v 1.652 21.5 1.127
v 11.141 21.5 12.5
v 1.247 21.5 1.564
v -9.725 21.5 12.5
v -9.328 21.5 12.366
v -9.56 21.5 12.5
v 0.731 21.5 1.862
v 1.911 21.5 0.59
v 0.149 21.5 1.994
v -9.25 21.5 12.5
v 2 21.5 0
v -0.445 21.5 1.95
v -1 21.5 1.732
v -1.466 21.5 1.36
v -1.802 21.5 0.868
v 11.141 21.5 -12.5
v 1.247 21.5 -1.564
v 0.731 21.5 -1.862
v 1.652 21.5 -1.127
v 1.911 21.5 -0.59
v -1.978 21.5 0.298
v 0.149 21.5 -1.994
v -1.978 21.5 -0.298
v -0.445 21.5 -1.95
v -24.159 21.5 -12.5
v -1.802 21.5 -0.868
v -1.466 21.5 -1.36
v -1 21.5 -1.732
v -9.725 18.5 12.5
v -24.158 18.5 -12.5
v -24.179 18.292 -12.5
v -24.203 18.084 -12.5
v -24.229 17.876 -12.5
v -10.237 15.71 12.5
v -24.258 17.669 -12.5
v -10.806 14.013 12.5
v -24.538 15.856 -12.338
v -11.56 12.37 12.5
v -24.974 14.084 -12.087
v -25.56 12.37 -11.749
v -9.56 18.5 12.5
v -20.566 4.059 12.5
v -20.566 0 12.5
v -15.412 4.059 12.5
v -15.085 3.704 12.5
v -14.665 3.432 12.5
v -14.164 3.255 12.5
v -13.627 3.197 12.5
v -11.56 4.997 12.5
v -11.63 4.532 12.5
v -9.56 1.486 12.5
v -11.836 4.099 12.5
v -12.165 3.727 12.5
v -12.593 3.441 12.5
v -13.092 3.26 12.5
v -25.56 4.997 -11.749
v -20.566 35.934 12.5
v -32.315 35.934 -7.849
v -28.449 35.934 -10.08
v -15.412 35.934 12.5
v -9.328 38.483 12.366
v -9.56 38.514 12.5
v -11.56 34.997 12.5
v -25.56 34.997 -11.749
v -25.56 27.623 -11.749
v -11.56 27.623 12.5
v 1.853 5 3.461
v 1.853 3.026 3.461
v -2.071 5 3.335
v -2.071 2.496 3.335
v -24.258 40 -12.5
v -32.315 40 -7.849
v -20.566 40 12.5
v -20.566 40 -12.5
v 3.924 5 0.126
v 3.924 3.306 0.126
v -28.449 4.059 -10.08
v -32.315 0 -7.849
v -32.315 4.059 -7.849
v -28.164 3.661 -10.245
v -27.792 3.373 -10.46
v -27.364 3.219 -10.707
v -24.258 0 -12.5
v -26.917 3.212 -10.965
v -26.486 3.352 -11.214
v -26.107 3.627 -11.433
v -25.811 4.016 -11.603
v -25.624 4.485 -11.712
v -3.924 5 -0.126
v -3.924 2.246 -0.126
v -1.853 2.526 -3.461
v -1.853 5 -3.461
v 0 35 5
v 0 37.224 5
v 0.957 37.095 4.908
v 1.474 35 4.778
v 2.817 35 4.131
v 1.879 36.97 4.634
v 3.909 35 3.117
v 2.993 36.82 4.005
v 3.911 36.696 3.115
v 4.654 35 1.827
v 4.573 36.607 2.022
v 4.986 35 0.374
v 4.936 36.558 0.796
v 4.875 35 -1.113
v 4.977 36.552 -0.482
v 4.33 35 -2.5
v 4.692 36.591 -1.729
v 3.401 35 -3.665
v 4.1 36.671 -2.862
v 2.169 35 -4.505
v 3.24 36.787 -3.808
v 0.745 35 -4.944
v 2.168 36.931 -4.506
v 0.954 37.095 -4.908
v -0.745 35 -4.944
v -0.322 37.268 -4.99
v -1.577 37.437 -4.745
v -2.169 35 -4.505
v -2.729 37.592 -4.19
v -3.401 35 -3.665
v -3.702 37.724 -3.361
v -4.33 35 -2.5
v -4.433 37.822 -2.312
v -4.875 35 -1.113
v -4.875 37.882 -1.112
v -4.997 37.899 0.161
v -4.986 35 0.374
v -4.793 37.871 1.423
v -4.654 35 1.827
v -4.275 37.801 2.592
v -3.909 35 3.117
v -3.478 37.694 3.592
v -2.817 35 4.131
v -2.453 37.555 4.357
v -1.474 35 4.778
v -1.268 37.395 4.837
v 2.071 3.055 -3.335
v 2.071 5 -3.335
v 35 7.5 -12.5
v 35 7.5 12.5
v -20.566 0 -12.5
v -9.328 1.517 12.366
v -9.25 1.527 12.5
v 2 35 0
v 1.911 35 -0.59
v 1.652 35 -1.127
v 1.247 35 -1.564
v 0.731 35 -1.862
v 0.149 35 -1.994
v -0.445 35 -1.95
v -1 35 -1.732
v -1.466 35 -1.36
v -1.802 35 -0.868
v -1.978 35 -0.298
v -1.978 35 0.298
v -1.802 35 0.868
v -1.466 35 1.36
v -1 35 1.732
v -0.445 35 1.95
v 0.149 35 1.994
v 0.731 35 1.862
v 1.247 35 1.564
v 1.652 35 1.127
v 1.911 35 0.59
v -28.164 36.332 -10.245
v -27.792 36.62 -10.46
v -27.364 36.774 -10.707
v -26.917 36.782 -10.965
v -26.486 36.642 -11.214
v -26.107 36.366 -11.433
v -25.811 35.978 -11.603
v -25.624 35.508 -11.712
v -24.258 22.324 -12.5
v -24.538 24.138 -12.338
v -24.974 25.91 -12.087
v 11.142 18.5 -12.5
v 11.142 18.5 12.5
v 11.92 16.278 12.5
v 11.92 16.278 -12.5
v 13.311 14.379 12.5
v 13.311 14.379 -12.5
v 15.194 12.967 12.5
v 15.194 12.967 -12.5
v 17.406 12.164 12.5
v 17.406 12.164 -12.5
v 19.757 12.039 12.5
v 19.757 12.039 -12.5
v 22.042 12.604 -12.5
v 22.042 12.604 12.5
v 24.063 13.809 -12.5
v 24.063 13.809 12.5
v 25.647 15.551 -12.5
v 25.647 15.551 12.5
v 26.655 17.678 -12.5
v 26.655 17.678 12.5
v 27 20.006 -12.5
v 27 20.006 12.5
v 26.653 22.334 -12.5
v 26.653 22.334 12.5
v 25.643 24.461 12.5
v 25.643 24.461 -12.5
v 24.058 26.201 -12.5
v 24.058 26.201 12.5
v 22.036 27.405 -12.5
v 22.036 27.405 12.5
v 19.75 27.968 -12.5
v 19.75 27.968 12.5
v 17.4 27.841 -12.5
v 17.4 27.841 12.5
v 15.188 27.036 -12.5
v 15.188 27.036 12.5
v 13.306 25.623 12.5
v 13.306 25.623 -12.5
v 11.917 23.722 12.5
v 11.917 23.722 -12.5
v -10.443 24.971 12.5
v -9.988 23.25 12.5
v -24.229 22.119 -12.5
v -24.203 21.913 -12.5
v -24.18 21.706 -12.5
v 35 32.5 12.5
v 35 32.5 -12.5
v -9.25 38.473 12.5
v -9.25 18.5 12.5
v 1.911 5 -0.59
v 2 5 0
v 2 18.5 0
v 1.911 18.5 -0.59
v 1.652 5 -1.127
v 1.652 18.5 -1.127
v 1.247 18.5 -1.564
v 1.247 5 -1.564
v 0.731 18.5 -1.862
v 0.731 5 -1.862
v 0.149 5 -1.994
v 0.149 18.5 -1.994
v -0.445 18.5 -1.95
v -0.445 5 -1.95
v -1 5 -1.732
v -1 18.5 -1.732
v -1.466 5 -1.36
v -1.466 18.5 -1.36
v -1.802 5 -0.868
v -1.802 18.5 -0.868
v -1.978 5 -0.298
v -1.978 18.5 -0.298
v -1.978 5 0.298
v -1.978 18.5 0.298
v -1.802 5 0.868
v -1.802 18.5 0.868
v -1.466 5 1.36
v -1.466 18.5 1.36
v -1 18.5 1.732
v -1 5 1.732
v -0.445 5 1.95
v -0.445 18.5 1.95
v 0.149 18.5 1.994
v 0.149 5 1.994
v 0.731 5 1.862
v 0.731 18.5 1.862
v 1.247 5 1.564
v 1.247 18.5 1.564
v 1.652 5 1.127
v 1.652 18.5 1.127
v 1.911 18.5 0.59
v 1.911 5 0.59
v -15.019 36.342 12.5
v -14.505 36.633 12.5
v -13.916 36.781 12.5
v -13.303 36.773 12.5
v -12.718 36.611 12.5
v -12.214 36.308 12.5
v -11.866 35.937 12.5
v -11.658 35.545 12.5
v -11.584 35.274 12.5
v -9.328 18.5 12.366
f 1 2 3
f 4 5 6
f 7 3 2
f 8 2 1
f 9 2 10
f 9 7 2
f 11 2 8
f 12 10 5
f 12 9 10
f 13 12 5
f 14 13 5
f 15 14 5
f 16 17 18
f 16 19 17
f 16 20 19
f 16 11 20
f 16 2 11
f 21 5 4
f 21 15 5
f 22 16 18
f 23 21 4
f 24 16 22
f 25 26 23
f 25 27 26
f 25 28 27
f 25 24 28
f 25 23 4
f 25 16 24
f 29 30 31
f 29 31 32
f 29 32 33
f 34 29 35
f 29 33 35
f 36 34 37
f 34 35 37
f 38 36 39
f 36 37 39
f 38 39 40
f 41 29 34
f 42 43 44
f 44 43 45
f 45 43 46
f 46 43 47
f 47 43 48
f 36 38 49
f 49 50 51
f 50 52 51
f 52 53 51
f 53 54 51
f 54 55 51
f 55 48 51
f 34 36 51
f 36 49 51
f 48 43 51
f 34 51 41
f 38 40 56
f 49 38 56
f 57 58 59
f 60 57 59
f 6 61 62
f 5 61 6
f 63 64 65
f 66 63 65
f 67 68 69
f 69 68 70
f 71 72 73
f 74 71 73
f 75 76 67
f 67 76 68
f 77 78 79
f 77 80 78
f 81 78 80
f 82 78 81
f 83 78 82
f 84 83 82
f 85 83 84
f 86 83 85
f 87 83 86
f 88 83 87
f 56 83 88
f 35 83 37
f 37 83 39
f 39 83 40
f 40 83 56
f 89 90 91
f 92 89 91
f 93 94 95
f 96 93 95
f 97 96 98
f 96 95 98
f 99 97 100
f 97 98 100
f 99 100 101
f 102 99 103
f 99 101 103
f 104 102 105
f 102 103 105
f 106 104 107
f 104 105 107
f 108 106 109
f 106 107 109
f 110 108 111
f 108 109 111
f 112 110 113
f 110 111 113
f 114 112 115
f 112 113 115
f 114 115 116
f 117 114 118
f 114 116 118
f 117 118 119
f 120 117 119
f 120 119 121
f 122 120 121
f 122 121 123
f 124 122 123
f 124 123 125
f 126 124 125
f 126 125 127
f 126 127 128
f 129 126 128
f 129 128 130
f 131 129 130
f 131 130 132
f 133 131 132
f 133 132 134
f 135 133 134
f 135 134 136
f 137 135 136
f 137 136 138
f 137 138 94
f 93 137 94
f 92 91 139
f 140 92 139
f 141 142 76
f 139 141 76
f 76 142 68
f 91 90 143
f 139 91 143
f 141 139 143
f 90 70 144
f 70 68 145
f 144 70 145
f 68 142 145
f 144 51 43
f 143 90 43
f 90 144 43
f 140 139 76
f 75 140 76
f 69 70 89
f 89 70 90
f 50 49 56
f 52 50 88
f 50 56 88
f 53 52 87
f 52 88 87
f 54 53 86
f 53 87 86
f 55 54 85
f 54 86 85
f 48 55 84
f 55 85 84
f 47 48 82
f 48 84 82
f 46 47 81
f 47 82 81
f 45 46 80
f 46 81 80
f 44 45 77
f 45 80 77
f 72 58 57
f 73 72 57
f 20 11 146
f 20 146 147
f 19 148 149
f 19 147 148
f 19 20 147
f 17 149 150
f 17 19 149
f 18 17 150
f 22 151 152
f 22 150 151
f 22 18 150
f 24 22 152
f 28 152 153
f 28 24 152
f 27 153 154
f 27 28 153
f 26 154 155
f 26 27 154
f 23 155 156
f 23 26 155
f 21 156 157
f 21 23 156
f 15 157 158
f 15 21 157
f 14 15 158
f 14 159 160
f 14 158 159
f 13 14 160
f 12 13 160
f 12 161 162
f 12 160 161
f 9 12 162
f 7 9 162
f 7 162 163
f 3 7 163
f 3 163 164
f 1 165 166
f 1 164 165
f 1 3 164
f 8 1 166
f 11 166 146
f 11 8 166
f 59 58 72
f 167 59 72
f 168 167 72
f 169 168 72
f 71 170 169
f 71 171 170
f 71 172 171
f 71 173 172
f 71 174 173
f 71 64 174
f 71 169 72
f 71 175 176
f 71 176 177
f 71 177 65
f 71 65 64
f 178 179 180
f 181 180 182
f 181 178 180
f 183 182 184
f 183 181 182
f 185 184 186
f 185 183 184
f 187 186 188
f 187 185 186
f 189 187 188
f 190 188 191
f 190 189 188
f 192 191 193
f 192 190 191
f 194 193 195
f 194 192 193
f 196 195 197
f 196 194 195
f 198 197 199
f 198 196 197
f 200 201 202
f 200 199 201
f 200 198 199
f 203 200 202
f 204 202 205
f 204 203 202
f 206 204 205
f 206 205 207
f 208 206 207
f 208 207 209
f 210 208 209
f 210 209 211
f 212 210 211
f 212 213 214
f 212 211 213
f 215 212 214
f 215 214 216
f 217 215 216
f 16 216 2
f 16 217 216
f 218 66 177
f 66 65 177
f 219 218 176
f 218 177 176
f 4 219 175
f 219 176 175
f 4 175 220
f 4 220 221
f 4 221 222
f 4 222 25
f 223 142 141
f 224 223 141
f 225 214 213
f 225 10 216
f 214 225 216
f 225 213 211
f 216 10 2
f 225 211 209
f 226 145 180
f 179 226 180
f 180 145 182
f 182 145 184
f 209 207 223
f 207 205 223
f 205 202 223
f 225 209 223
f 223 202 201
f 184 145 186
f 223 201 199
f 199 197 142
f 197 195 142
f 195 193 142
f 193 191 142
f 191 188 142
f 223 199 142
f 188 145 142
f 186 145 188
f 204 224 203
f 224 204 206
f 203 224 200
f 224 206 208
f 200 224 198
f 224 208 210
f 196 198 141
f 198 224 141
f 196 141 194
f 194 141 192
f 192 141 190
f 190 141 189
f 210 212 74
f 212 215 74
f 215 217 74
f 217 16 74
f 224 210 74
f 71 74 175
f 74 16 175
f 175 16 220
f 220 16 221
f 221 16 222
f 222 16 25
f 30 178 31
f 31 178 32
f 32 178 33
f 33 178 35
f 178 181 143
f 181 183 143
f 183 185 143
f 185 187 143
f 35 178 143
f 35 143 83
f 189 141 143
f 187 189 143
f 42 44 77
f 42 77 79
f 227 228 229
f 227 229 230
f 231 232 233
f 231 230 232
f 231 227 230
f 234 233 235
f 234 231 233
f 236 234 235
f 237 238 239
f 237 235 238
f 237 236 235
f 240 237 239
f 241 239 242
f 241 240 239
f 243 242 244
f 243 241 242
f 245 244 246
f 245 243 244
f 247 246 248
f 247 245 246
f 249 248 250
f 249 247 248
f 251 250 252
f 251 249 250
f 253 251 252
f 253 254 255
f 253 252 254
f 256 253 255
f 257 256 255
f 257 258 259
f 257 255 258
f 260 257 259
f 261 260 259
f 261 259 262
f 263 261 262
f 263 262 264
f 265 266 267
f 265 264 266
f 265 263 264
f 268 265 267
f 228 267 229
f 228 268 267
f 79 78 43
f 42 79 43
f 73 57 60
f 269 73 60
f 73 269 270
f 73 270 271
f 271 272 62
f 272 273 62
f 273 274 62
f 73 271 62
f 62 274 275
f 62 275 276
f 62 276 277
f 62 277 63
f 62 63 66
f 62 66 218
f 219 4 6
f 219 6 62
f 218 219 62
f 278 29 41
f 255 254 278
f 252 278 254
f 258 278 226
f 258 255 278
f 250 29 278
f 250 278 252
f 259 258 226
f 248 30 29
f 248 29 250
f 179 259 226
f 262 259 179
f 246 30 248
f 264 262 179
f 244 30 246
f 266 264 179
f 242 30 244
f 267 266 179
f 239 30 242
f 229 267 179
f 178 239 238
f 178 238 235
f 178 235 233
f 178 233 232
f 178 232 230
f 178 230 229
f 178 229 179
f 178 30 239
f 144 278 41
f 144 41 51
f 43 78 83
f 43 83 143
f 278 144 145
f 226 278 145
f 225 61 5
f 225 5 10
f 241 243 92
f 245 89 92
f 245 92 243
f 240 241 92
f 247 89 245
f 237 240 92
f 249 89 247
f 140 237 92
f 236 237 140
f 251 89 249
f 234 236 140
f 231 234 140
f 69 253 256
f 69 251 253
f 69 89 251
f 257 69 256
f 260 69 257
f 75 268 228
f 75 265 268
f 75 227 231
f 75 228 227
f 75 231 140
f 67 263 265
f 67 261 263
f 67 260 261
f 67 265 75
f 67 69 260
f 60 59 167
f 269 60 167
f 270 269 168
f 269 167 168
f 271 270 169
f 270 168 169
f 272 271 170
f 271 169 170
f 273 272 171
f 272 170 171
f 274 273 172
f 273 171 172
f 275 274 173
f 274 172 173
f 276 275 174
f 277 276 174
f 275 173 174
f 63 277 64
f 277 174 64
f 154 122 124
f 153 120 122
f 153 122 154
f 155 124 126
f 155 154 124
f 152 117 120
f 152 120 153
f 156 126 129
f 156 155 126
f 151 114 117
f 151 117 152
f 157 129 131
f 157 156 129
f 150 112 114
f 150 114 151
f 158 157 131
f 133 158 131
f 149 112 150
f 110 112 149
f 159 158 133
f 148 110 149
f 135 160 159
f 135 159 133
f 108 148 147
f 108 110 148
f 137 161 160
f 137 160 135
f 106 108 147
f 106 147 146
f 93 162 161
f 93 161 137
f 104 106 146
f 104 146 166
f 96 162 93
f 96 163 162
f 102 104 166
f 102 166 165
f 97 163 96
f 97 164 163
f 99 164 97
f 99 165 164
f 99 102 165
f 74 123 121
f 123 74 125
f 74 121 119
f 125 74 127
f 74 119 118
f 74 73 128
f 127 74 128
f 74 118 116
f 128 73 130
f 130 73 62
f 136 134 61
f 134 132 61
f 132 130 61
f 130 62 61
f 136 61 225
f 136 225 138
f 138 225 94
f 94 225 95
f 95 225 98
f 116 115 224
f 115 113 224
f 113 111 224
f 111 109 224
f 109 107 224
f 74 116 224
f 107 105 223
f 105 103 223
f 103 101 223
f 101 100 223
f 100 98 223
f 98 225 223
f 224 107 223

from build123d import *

# Parameters (mm, degrees)
BOSS_EXTRUDE1_DEPTH     = 40
CUT_EXTRUDE1_DEPTH      = 40
SKETCH3_W               = 4.376715803
SKETCH3_H               = 7.921330006
BOSS_EXTRUDE2_DEPTH     = 40
CUT_EXTRUDE2_DEPTH      = 78.145313728
CUT_EXTRUDE2_DEPTH_BACK = 78.145313728
CUT_EXTRUDE3_DEPTH      = 40
CUT_EXTRUDE4_DEPTH      = 43.935998882
CUT_EXTRUDE4_DEPTH_BACK = 43.935998882
SKETCH6_R               = 2
CUT_EXTRUDE5_DEPTH      = 5
SKETCH8_R               = 5
CUT_EXTRUDE6_DEPTH      = 5
CUT_EXTRUDE7_START      = -2
SKETCH9_W               = 6.222682415
SKETCH9_H               = 53.403341902
CUT_EXTRUDE7_DEPTH      = 16


with BuildPart() as part:
    # Sketch1 → Boss-Extrude1 (new body)
    with BuildSketch(Plane(origin=(0, 0, 0), x_dir=(1, 0, 0), z_dir=(0, 1, 0))):
        Polygon((-35, 12.5), (-20.56624327, -12.5), (35, -12.5), (35, 12.5), align=None)
    extrude(amount=BOSS_EXTRUDE1_DEPTH)

    # Sketch2 → Cut-Extrude1 (cut)
    with BuildSketch(Plane.XY.offset(12.5)):
        Polygon((-20.56624327, 40), (35, 32.5), (35, 40), align=None)
        Polygon((35, 7.5), (-20.56624327, 0), (35, 0), align=None)
    extrude(amount=-CUT_EXTRUDE1_DEPTH, mode=Mode.SUBTRACT)

    # Sketch3 → Boss-Extrude2 (add)
    with BuildSketch(Plane(origin=(-20.837341226, 0, 12.030444566), x_dir=(0.4999999999999981, 0, 0.8660254037844397), z_dir=(-0.8660254037844398, 0, 0.4999999999999982))):
        with Locations((-10.675795445, 21.421253709)):
            Rectangle(SKETCH3_W, SKETCH3_H)
    extrude(amount=BOSS_EXTRUDE2_DEPTH)

    # Sketch4 → Cut-Extrude2 (cut, two sides: drawn at the far end of the back side and taken through both)
    with BuildSketch(Plane(origin=(-4.243718771, 0, -7.350336525), x_dir=(0.8660254037844397, 0, -0.4999999999999983), z_dir=(0.4999999999999982, 0, 0.8660254037844396)).offset(-CUT_EXTRUDE2_DEPTH_BACK)):
        with BuildLine():
            Line((-25.260889132, 35.934120187), (-19.597573928, 35.934120187))
            ThreePointArc((-19.597573928, 35.934120187), (-17.574079433, 36.729704946), (-16.260889132, 34.996783621))
            Line((-16.260889132, 34.996783621), (-16.260889132, 27.623217913))
            ThreePointArc((-16.260889132, 27.623217913), (-14.610889132, 19.996783621), (-16.260889132, 12.37034933))
            Line((-16.260889132, 12.37034933), (-16.260889132, 4.996783621))
            ThreePointArc((-16.260889132, 4.996783621), (-17.574079433, 3.263862297), (-19.597573928, 4.059447055))
            Line((-19.597573928, 4.059447055), (-25.260889132, 4.059447055))
            Line((-25.260889132, 4.059447055), (-25.260889132, 11.549622397))
            Line((-25.260889132, 11.549622397), (-69.354192402, 11.549622397))
            Line((-69.354192402, 11.549622397), (-69.354192402, 27.546843348))
            Line((-69.354192402, 27.546843348), (-25.260889132, 26.613076168))
            Line((-25.260889132, 26.613076168), (-25.260889132, 35.934120187))
        make_face()
    extrude(amount=CUT_EXTRUDE2_DEPTH + CUT_EXTRUDE2_DEPTH_BACK, mode=Mode.SUBTRACT)

    # Sketch5 → Cut-Extrude3 (cut)
    with BuildSketch(Plane(origin=(0, 0, -12.5), x_dir=(-1, 0, 0), z_dir=(0, 0, -1))):
        with BuildLine():
            Line((-11.141275202, 21.5), (29.874932975, 21.5))
            Line((29.874932975, 21.5), (29.874932975, 18.5))
            Line((29.874932975, 18.5), (-11.142492493, 18.5))
            ThreePointArc((-11.142492493, 18.5), (-26.999999341, 20.006434648), (-11.141275202, 21.5))
        make_face()
    extrude(amount=-CUT_EXTRUDE3_DEPTH, mode=Mode.SUBTRACT)

    # Sketch6 → Cut-Extrude4 (cut, two sides: drawn at the far end of the back side and taken through both)
    with BuildSketch(Plane(origin=(0, 18.5, 0), x_dir=(1, 0, 0), z_dir=(0, 1, 0)).offset(-CUT_EXTRUDE4_DEPTH_BACK)):
        Circle(SKETCH6_R)
    extrude(amount=CUT_EXTRUDE4_DEPTH + CUT_EXTRUDE4_DEPTH_BACK, mode=Mode.SUBTRACT)

    # Sketch7 → Cut-Extrude5 (cut)
    with BuildSketch(Plane.XZ):
        Polygon((1.8525736, 3.461402084), (-2.071375338, 3.335076842), (-3.923948938, -0.126325242), (-1.8525736, -3.461402084), (2.071375338, -3.335076842), (3.923948938, 0.126325242), align=None)
    extrude(amount=-CUT_EXTRUDE5_DEPTH, mode=Mode.SUBTRACT)

    # Sketch8 → Cut-Extrude6 (cut)
    with BuildSketch(Plane(origin=(0, 40, 0), x_dir=(1, 0, 0), z_dir=(0, 1, 0))):
        with Locations(Location((0, 0, 0), (0, 0, 270))):
            Circle(SKETCH8_R)
    extrude(amount=-CUT_EXTRUDE6_DEPTH, mode=Mode.SUBTRACT)

    # Sketch9 → Cut-Extrude7 (cut)
    with BuildSketch(Plane(origin=(-14.082343077, 0, 8.130444566), x_dir=(0.4999999999999982, 0, 0.8660254037844397), z_dir=(-0.8660254037844398, 0, 0.4999999999999983)).offset(CUT_EXTRUDE7_START)):
        with Locations((-26.065813196, 19.047949313)):
            Rectangle(SKETCH9_W, SKETCH9_H)
        Polygon((6.045528012, 45.749620264), (6.045528012, -7.653721638), (13.717164193, -7.653721638), (13.717164193, 42.686575292), (13.717164193, 45.749620264), align=None)
    extrude(amount=CUT_EXTRUDE7_DEPTH, mode=Mode.SUBTRACT)


solid = part.part
